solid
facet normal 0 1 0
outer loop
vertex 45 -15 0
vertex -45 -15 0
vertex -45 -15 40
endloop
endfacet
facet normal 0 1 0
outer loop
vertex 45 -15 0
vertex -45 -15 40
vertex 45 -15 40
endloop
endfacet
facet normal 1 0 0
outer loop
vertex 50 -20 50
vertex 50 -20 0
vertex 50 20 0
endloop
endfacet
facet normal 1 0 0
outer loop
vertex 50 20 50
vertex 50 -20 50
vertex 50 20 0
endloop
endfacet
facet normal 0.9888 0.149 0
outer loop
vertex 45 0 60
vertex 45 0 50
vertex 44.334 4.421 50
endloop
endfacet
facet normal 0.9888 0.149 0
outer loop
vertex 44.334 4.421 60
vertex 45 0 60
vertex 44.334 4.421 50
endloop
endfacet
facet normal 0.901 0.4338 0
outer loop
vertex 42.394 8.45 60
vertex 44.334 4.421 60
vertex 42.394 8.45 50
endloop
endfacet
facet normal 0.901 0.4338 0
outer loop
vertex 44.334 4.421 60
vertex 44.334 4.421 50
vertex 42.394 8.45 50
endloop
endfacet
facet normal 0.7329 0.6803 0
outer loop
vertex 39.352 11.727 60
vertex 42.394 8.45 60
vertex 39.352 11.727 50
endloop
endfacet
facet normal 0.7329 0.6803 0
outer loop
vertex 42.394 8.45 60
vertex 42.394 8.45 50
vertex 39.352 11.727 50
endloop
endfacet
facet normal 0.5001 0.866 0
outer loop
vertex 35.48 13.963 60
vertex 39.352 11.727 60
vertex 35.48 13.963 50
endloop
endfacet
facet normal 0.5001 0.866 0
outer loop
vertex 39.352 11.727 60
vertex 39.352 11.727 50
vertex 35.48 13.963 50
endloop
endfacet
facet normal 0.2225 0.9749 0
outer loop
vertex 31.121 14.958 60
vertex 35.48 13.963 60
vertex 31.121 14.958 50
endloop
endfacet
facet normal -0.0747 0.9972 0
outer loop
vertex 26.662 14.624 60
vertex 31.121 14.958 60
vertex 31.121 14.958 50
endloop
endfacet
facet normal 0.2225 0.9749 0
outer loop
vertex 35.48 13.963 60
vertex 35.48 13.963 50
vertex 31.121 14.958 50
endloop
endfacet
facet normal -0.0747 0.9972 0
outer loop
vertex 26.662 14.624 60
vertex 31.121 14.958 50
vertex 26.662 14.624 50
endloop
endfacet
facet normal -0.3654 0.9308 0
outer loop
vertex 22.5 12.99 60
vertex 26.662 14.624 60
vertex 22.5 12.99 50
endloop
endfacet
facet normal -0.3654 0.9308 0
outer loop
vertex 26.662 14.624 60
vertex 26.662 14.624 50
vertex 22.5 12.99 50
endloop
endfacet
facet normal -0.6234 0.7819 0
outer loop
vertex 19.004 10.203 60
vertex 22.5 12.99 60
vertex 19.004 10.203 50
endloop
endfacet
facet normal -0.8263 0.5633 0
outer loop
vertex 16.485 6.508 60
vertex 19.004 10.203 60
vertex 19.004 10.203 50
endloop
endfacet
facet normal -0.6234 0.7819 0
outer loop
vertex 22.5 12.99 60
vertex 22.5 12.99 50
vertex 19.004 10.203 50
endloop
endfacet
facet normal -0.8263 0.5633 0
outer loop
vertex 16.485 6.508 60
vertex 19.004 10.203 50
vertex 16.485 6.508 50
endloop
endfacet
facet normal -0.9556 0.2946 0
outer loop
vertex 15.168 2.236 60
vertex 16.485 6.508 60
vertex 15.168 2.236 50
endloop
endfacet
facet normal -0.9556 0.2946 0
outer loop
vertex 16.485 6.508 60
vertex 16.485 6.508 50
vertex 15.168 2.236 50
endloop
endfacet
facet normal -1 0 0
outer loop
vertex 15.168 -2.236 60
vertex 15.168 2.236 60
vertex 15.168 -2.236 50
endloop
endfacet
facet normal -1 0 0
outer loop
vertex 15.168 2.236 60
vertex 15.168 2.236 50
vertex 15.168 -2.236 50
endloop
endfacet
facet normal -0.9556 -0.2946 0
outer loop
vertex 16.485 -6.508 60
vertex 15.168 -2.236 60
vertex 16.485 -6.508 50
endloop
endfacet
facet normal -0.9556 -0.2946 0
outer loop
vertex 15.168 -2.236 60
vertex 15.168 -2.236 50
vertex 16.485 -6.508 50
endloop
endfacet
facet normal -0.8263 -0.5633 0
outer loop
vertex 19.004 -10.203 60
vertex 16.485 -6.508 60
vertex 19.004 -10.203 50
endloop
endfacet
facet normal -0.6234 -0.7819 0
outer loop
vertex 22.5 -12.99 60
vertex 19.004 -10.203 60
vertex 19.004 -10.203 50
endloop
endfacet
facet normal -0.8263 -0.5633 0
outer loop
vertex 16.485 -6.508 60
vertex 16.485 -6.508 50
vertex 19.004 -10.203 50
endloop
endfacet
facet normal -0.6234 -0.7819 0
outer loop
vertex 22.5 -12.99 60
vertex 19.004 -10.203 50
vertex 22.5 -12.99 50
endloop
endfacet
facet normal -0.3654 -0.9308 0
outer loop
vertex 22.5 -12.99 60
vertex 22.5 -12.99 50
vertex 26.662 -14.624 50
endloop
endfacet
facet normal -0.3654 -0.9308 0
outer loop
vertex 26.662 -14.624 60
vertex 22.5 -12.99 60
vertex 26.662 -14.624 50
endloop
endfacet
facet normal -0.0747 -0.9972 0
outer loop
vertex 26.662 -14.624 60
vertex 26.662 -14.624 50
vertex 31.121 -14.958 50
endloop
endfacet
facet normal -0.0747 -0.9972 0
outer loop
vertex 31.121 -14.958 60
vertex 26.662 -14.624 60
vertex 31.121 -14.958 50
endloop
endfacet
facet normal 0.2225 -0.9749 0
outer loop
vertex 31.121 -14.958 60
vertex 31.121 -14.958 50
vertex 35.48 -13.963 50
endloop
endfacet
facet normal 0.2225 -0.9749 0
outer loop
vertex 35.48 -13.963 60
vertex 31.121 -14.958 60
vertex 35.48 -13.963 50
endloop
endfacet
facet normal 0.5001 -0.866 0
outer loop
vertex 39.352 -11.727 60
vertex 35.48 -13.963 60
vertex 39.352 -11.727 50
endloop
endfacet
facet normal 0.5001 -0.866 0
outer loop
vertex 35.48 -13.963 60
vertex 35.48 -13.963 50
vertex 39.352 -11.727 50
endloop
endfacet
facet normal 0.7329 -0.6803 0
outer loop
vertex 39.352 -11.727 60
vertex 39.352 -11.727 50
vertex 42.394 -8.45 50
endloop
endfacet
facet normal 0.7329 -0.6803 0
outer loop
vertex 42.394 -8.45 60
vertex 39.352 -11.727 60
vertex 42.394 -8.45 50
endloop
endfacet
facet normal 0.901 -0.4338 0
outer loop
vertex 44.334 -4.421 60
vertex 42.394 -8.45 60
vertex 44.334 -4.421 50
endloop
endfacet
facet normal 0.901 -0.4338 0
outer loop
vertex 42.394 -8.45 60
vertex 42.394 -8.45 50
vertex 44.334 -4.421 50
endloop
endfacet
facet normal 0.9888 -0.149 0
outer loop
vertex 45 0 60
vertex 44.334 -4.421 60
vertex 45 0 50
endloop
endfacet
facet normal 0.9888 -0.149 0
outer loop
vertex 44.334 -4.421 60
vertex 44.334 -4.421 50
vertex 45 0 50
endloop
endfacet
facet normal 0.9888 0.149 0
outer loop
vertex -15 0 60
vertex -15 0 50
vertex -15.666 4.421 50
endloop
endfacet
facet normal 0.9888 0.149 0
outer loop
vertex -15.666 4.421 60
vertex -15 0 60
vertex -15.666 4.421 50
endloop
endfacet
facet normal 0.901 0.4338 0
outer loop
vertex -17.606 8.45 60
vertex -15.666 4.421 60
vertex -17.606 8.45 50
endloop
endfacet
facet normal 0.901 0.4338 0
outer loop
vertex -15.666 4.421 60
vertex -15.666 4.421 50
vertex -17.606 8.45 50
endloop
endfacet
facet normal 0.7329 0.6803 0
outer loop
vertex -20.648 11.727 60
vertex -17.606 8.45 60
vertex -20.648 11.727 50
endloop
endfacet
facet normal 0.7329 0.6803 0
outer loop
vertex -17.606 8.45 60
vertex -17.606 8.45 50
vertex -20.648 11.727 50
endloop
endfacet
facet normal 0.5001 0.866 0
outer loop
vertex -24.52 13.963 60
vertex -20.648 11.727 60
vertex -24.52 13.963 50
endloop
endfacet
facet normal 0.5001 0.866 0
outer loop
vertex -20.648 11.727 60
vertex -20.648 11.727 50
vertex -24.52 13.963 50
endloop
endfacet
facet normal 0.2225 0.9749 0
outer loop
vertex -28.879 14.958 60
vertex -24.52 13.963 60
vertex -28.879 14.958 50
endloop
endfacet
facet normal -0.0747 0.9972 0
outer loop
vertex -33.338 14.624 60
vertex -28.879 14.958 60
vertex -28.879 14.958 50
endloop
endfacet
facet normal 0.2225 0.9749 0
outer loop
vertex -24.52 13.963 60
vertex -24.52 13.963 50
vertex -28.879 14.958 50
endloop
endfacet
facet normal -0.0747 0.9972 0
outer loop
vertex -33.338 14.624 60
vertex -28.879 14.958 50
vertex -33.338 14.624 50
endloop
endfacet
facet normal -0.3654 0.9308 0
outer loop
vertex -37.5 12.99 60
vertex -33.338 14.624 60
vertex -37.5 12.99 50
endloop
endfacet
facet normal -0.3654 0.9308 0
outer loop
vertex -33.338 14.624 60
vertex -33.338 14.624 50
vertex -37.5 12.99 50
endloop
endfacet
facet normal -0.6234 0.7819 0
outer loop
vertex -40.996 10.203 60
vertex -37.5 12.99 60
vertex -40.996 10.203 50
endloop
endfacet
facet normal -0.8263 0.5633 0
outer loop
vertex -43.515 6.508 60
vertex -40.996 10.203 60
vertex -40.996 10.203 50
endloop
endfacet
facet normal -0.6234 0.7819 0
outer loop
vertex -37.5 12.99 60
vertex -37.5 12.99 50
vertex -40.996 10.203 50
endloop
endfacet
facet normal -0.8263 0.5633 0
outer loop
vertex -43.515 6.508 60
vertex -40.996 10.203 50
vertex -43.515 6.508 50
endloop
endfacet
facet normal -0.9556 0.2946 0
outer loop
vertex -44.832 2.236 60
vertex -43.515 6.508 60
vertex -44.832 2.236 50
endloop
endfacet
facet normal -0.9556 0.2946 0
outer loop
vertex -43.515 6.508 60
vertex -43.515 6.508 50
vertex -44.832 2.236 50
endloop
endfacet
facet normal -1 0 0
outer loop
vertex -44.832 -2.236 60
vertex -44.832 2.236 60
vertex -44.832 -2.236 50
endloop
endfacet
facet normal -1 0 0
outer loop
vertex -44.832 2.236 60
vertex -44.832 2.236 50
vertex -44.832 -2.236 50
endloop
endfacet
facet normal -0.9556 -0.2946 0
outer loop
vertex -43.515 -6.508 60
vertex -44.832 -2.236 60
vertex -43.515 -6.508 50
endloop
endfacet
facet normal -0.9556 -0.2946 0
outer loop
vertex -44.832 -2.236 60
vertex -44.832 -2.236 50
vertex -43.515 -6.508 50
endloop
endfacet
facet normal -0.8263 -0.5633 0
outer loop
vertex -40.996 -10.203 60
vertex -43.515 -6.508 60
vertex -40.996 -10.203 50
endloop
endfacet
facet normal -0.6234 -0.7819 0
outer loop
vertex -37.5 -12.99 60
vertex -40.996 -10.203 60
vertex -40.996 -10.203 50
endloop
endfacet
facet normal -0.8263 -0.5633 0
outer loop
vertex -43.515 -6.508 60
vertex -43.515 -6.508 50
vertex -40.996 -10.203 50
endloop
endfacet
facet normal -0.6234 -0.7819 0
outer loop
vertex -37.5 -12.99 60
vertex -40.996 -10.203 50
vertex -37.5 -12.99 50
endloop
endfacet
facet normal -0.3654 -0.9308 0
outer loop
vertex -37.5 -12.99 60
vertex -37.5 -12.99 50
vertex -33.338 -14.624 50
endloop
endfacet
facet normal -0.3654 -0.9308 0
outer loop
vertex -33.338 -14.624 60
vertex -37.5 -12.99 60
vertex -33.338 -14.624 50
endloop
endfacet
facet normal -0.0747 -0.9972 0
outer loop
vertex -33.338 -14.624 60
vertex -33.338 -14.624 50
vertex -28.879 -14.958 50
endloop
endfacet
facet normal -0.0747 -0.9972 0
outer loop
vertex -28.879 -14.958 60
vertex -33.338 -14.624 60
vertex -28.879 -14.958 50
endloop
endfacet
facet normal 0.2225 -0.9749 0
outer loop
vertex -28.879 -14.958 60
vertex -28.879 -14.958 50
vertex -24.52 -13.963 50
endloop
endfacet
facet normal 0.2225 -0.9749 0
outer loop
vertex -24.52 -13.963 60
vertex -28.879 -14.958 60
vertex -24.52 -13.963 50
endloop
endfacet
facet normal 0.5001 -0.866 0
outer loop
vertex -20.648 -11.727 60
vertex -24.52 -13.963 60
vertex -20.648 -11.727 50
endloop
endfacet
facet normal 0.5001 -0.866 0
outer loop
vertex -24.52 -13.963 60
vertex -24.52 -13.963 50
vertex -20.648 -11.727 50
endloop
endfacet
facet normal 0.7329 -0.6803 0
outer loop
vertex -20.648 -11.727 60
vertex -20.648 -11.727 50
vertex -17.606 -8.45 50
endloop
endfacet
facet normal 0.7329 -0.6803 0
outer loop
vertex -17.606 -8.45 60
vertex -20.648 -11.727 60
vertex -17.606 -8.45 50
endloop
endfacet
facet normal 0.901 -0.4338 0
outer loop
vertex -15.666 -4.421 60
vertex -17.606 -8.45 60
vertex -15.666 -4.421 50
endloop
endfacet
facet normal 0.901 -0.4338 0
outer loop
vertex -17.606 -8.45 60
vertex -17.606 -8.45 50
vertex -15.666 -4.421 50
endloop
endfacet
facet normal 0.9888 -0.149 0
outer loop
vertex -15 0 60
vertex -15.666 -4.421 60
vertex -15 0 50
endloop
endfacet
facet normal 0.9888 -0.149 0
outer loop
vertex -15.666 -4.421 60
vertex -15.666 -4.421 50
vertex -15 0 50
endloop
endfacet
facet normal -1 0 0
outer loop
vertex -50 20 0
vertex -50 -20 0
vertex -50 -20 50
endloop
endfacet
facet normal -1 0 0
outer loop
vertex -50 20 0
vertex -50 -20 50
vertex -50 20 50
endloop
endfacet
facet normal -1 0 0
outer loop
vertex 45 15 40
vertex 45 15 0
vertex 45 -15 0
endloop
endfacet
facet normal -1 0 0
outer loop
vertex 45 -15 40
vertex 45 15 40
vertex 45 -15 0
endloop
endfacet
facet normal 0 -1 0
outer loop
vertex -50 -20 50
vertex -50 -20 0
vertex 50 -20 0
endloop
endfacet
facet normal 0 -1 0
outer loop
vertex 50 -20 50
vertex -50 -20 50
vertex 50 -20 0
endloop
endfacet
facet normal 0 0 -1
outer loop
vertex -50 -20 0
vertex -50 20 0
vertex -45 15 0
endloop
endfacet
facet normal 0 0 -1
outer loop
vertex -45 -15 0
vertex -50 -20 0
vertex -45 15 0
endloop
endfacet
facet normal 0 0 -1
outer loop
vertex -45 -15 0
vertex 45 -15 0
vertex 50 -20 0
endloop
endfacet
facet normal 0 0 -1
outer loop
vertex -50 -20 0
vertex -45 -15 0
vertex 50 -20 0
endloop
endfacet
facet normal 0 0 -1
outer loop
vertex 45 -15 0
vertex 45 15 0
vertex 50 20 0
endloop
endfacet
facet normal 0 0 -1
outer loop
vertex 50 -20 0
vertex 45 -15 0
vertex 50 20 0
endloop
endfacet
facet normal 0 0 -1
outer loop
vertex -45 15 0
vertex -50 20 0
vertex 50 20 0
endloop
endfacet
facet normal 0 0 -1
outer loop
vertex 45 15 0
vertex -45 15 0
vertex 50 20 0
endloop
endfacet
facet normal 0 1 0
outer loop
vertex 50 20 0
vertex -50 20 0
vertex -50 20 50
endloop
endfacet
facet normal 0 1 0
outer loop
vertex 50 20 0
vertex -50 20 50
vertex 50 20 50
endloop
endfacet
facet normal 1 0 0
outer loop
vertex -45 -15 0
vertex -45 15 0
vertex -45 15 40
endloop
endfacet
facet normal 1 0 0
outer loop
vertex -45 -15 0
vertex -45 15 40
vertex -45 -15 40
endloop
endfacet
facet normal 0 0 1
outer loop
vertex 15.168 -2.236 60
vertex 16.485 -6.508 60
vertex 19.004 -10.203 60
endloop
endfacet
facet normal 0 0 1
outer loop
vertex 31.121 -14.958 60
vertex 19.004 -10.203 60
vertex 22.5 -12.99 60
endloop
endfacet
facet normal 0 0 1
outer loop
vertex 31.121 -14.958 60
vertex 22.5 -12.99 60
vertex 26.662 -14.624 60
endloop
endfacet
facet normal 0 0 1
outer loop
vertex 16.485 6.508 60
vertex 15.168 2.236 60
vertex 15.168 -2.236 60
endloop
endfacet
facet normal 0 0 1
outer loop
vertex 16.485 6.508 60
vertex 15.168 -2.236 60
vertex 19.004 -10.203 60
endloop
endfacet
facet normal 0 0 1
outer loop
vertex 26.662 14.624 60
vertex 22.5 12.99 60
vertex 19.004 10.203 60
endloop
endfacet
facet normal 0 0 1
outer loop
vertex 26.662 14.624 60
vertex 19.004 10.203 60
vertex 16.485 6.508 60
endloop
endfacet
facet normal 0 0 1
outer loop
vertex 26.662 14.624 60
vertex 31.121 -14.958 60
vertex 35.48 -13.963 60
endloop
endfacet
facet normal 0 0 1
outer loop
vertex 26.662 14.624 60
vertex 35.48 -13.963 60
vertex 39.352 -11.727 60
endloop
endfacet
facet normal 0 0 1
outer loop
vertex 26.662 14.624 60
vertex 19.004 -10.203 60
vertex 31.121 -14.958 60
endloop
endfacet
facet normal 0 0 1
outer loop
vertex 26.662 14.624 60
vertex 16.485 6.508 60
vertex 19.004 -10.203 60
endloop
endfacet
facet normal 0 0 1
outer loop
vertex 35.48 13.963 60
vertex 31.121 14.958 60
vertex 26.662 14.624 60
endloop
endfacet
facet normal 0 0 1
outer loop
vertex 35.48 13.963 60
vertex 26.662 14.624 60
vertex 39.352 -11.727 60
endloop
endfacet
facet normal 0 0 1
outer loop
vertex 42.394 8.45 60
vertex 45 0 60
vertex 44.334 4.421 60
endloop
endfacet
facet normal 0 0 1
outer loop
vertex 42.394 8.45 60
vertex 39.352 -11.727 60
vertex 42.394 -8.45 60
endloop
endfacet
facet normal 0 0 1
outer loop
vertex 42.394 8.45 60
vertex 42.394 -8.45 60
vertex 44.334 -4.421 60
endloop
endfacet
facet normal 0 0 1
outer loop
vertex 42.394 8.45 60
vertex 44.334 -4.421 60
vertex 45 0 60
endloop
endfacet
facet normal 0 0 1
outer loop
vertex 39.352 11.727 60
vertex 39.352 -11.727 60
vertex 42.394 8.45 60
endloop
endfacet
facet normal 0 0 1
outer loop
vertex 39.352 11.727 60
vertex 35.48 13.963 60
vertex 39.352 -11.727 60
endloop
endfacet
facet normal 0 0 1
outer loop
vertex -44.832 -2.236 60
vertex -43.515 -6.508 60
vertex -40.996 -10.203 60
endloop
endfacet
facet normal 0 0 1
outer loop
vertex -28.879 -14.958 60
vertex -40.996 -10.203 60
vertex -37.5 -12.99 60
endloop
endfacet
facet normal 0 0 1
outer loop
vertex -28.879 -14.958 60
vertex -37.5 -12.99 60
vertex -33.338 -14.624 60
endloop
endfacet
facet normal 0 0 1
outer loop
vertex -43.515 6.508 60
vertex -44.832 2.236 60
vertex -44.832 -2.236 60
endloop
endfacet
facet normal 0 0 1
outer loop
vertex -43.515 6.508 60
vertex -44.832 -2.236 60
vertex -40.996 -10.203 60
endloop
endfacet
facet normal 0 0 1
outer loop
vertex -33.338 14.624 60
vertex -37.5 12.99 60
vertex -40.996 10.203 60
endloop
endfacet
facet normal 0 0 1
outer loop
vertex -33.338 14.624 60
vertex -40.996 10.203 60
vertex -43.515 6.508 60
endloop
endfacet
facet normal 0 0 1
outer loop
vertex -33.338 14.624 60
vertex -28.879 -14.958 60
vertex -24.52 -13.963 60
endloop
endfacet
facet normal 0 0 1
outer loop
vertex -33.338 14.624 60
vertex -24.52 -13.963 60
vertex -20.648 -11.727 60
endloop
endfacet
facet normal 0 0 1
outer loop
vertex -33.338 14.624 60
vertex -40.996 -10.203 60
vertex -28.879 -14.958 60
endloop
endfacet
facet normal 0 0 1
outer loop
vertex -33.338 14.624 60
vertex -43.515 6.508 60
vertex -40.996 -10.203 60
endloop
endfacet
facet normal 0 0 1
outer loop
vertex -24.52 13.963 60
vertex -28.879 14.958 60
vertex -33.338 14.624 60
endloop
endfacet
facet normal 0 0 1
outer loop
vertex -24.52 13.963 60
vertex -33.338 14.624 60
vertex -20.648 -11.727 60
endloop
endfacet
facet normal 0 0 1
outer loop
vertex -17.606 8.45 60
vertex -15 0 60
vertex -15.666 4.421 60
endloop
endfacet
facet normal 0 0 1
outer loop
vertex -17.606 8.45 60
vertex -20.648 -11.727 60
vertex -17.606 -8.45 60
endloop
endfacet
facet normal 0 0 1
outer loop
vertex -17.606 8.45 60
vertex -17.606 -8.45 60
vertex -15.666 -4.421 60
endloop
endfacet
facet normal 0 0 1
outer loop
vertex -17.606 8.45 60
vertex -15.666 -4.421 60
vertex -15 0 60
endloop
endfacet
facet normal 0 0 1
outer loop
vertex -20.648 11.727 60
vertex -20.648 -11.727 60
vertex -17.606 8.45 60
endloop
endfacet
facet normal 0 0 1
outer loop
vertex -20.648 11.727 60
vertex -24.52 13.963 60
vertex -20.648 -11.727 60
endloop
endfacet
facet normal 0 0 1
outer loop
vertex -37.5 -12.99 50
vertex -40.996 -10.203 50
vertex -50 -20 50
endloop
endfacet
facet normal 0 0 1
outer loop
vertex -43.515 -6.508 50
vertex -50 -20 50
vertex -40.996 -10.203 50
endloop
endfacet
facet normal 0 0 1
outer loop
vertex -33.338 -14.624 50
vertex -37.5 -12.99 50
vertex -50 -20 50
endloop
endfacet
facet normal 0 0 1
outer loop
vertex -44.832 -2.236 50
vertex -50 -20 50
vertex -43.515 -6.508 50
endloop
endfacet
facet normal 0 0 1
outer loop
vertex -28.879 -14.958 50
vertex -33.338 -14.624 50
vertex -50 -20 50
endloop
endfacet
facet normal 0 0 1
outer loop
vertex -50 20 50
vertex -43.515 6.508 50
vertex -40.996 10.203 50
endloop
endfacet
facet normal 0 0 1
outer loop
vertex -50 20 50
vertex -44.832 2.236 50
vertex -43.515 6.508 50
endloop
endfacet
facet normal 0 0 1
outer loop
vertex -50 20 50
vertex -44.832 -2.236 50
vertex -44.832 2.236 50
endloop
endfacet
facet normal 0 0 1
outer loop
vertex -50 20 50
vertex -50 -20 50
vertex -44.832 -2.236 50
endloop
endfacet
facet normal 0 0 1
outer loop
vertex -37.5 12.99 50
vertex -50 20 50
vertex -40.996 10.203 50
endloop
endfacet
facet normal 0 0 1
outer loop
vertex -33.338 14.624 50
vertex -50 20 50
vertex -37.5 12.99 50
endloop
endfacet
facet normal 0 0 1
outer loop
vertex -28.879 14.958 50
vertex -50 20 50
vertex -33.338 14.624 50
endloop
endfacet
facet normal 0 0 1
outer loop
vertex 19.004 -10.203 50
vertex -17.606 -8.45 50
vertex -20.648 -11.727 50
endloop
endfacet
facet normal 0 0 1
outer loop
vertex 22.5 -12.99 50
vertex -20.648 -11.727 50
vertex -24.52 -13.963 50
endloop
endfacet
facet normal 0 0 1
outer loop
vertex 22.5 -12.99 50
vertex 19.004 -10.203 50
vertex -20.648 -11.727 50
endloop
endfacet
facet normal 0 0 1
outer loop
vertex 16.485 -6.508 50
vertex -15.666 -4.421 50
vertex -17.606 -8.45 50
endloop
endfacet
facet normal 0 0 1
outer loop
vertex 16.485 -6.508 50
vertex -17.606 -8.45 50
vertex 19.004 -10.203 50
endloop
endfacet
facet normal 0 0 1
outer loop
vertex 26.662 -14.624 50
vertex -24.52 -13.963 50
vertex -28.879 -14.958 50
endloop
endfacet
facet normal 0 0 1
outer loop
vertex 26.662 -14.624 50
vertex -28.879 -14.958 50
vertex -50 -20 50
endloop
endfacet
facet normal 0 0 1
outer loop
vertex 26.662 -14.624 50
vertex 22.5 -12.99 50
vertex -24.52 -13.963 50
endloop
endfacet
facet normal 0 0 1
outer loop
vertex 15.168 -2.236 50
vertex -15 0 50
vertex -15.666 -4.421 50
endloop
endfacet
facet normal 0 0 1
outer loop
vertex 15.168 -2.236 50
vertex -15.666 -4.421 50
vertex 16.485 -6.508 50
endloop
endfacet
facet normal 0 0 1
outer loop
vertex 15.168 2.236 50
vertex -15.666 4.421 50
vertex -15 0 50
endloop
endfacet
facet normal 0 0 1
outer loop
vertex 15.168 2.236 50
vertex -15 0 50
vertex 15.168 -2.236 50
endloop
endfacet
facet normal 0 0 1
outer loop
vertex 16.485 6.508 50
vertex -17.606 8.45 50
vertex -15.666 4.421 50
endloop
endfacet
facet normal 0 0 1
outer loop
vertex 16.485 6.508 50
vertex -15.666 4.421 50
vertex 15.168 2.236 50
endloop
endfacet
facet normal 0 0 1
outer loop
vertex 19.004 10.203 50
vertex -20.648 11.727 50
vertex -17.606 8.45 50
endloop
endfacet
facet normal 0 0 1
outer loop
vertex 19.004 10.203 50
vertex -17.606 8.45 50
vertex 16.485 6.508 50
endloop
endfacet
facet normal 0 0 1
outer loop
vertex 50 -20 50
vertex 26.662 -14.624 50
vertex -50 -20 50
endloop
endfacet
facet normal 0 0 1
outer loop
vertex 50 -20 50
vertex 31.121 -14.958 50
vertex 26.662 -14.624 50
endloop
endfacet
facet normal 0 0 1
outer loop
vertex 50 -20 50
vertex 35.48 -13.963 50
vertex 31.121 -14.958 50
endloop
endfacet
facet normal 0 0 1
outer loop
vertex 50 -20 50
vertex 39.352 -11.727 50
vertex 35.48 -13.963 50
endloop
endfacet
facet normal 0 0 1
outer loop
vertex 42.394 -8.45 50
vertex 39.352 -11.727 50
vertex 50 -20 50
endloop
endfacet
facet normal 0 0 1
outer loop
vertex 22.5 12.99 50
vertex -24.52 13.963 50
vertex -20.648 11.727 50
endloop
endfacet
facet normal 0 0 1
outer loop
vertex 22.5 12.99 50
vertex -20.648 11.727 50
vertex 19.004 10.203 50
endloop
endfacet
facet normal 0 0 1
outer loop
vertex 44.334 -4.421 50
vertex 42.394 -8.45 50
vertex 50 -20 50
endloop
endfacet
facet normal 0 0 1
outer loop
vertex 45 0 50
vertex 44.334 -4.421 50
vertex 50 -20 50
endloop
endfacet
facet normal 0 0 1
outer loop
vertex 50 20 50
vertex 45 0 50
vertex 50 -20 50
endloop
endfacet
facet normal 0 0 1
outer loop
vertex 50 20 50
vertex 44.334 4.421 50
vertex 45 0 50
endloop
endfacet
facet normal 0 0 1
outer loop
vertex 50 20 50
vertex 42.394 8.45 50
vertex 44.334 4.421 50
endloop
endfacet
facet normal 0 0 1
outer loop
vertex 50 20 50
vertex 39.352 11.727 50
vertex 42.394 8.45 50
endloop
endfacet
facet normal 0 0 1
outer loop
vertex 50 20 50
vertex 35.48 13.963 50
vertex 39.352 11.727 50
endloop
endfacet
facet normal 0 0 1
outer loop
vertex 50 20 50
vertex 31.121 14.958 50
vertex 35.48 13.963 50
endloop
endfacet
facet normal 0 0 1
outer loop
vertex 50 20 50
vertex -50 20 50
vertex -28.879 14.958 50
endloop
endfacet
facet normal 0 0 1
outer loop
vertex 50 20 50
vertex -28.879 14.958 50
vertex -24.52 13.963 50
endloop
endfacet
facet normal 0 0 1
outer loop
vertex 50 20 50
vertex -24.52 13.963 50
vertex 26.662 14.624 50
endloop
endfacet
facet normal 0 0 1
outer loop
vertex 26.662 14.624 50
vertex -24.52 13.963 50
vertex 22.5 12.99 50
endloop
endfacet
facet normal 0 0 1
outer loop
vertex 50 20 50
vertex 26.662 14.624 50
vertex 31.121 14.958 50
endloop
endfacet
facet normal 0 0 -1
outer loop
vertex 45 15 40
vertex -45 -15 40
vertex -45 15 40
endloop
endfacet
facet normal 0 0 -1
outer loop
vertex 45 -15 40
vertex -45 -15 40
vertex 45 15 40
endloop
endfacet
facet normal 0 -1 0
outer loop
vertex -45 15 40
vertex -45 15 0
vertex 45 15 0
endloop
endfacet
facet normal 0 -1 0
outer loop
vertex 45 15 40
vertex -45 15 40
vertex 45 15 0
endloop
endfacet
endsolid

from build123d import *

# Parameters (mm, degrees)
F0_W     = 100
F0_H     = 40
F1_DEPTH = 50
F2_R     = 15
F3_DEPTH = 10
F4_W     = 90
F4_H     = 30
F5_DEPTH = 40


with BuildPart() as f1:
    # F0 (on Top) → F1 (new body)
    with BuildSketch(Plane.XY):
        Rectangle(F0_W, F0_H)
    extrude(amount=F1_DEPTH)

    # F2 (on face) → F3 (join)
    with BuildSketch(Plane.XY.offset(50)):
        with Locations((30, 0)):
            Circle(F2_R)
        with Locations((-30, 0)):
            Circle(F2_R)
    extrude(amount=F3_DEPTH)

    # F4 (on face) → F5 (cut)
    with BuildSketch(Plane(origin=(0, 0, 0), x_dir=(1, 0, 0), z_dir=(0, 0, -1))):
        Rectangle(F4_W, F4_H)
    extrude(amount=-F5_DEPTH, mode=Mode.SUBTRACT)


solid = f1.part
